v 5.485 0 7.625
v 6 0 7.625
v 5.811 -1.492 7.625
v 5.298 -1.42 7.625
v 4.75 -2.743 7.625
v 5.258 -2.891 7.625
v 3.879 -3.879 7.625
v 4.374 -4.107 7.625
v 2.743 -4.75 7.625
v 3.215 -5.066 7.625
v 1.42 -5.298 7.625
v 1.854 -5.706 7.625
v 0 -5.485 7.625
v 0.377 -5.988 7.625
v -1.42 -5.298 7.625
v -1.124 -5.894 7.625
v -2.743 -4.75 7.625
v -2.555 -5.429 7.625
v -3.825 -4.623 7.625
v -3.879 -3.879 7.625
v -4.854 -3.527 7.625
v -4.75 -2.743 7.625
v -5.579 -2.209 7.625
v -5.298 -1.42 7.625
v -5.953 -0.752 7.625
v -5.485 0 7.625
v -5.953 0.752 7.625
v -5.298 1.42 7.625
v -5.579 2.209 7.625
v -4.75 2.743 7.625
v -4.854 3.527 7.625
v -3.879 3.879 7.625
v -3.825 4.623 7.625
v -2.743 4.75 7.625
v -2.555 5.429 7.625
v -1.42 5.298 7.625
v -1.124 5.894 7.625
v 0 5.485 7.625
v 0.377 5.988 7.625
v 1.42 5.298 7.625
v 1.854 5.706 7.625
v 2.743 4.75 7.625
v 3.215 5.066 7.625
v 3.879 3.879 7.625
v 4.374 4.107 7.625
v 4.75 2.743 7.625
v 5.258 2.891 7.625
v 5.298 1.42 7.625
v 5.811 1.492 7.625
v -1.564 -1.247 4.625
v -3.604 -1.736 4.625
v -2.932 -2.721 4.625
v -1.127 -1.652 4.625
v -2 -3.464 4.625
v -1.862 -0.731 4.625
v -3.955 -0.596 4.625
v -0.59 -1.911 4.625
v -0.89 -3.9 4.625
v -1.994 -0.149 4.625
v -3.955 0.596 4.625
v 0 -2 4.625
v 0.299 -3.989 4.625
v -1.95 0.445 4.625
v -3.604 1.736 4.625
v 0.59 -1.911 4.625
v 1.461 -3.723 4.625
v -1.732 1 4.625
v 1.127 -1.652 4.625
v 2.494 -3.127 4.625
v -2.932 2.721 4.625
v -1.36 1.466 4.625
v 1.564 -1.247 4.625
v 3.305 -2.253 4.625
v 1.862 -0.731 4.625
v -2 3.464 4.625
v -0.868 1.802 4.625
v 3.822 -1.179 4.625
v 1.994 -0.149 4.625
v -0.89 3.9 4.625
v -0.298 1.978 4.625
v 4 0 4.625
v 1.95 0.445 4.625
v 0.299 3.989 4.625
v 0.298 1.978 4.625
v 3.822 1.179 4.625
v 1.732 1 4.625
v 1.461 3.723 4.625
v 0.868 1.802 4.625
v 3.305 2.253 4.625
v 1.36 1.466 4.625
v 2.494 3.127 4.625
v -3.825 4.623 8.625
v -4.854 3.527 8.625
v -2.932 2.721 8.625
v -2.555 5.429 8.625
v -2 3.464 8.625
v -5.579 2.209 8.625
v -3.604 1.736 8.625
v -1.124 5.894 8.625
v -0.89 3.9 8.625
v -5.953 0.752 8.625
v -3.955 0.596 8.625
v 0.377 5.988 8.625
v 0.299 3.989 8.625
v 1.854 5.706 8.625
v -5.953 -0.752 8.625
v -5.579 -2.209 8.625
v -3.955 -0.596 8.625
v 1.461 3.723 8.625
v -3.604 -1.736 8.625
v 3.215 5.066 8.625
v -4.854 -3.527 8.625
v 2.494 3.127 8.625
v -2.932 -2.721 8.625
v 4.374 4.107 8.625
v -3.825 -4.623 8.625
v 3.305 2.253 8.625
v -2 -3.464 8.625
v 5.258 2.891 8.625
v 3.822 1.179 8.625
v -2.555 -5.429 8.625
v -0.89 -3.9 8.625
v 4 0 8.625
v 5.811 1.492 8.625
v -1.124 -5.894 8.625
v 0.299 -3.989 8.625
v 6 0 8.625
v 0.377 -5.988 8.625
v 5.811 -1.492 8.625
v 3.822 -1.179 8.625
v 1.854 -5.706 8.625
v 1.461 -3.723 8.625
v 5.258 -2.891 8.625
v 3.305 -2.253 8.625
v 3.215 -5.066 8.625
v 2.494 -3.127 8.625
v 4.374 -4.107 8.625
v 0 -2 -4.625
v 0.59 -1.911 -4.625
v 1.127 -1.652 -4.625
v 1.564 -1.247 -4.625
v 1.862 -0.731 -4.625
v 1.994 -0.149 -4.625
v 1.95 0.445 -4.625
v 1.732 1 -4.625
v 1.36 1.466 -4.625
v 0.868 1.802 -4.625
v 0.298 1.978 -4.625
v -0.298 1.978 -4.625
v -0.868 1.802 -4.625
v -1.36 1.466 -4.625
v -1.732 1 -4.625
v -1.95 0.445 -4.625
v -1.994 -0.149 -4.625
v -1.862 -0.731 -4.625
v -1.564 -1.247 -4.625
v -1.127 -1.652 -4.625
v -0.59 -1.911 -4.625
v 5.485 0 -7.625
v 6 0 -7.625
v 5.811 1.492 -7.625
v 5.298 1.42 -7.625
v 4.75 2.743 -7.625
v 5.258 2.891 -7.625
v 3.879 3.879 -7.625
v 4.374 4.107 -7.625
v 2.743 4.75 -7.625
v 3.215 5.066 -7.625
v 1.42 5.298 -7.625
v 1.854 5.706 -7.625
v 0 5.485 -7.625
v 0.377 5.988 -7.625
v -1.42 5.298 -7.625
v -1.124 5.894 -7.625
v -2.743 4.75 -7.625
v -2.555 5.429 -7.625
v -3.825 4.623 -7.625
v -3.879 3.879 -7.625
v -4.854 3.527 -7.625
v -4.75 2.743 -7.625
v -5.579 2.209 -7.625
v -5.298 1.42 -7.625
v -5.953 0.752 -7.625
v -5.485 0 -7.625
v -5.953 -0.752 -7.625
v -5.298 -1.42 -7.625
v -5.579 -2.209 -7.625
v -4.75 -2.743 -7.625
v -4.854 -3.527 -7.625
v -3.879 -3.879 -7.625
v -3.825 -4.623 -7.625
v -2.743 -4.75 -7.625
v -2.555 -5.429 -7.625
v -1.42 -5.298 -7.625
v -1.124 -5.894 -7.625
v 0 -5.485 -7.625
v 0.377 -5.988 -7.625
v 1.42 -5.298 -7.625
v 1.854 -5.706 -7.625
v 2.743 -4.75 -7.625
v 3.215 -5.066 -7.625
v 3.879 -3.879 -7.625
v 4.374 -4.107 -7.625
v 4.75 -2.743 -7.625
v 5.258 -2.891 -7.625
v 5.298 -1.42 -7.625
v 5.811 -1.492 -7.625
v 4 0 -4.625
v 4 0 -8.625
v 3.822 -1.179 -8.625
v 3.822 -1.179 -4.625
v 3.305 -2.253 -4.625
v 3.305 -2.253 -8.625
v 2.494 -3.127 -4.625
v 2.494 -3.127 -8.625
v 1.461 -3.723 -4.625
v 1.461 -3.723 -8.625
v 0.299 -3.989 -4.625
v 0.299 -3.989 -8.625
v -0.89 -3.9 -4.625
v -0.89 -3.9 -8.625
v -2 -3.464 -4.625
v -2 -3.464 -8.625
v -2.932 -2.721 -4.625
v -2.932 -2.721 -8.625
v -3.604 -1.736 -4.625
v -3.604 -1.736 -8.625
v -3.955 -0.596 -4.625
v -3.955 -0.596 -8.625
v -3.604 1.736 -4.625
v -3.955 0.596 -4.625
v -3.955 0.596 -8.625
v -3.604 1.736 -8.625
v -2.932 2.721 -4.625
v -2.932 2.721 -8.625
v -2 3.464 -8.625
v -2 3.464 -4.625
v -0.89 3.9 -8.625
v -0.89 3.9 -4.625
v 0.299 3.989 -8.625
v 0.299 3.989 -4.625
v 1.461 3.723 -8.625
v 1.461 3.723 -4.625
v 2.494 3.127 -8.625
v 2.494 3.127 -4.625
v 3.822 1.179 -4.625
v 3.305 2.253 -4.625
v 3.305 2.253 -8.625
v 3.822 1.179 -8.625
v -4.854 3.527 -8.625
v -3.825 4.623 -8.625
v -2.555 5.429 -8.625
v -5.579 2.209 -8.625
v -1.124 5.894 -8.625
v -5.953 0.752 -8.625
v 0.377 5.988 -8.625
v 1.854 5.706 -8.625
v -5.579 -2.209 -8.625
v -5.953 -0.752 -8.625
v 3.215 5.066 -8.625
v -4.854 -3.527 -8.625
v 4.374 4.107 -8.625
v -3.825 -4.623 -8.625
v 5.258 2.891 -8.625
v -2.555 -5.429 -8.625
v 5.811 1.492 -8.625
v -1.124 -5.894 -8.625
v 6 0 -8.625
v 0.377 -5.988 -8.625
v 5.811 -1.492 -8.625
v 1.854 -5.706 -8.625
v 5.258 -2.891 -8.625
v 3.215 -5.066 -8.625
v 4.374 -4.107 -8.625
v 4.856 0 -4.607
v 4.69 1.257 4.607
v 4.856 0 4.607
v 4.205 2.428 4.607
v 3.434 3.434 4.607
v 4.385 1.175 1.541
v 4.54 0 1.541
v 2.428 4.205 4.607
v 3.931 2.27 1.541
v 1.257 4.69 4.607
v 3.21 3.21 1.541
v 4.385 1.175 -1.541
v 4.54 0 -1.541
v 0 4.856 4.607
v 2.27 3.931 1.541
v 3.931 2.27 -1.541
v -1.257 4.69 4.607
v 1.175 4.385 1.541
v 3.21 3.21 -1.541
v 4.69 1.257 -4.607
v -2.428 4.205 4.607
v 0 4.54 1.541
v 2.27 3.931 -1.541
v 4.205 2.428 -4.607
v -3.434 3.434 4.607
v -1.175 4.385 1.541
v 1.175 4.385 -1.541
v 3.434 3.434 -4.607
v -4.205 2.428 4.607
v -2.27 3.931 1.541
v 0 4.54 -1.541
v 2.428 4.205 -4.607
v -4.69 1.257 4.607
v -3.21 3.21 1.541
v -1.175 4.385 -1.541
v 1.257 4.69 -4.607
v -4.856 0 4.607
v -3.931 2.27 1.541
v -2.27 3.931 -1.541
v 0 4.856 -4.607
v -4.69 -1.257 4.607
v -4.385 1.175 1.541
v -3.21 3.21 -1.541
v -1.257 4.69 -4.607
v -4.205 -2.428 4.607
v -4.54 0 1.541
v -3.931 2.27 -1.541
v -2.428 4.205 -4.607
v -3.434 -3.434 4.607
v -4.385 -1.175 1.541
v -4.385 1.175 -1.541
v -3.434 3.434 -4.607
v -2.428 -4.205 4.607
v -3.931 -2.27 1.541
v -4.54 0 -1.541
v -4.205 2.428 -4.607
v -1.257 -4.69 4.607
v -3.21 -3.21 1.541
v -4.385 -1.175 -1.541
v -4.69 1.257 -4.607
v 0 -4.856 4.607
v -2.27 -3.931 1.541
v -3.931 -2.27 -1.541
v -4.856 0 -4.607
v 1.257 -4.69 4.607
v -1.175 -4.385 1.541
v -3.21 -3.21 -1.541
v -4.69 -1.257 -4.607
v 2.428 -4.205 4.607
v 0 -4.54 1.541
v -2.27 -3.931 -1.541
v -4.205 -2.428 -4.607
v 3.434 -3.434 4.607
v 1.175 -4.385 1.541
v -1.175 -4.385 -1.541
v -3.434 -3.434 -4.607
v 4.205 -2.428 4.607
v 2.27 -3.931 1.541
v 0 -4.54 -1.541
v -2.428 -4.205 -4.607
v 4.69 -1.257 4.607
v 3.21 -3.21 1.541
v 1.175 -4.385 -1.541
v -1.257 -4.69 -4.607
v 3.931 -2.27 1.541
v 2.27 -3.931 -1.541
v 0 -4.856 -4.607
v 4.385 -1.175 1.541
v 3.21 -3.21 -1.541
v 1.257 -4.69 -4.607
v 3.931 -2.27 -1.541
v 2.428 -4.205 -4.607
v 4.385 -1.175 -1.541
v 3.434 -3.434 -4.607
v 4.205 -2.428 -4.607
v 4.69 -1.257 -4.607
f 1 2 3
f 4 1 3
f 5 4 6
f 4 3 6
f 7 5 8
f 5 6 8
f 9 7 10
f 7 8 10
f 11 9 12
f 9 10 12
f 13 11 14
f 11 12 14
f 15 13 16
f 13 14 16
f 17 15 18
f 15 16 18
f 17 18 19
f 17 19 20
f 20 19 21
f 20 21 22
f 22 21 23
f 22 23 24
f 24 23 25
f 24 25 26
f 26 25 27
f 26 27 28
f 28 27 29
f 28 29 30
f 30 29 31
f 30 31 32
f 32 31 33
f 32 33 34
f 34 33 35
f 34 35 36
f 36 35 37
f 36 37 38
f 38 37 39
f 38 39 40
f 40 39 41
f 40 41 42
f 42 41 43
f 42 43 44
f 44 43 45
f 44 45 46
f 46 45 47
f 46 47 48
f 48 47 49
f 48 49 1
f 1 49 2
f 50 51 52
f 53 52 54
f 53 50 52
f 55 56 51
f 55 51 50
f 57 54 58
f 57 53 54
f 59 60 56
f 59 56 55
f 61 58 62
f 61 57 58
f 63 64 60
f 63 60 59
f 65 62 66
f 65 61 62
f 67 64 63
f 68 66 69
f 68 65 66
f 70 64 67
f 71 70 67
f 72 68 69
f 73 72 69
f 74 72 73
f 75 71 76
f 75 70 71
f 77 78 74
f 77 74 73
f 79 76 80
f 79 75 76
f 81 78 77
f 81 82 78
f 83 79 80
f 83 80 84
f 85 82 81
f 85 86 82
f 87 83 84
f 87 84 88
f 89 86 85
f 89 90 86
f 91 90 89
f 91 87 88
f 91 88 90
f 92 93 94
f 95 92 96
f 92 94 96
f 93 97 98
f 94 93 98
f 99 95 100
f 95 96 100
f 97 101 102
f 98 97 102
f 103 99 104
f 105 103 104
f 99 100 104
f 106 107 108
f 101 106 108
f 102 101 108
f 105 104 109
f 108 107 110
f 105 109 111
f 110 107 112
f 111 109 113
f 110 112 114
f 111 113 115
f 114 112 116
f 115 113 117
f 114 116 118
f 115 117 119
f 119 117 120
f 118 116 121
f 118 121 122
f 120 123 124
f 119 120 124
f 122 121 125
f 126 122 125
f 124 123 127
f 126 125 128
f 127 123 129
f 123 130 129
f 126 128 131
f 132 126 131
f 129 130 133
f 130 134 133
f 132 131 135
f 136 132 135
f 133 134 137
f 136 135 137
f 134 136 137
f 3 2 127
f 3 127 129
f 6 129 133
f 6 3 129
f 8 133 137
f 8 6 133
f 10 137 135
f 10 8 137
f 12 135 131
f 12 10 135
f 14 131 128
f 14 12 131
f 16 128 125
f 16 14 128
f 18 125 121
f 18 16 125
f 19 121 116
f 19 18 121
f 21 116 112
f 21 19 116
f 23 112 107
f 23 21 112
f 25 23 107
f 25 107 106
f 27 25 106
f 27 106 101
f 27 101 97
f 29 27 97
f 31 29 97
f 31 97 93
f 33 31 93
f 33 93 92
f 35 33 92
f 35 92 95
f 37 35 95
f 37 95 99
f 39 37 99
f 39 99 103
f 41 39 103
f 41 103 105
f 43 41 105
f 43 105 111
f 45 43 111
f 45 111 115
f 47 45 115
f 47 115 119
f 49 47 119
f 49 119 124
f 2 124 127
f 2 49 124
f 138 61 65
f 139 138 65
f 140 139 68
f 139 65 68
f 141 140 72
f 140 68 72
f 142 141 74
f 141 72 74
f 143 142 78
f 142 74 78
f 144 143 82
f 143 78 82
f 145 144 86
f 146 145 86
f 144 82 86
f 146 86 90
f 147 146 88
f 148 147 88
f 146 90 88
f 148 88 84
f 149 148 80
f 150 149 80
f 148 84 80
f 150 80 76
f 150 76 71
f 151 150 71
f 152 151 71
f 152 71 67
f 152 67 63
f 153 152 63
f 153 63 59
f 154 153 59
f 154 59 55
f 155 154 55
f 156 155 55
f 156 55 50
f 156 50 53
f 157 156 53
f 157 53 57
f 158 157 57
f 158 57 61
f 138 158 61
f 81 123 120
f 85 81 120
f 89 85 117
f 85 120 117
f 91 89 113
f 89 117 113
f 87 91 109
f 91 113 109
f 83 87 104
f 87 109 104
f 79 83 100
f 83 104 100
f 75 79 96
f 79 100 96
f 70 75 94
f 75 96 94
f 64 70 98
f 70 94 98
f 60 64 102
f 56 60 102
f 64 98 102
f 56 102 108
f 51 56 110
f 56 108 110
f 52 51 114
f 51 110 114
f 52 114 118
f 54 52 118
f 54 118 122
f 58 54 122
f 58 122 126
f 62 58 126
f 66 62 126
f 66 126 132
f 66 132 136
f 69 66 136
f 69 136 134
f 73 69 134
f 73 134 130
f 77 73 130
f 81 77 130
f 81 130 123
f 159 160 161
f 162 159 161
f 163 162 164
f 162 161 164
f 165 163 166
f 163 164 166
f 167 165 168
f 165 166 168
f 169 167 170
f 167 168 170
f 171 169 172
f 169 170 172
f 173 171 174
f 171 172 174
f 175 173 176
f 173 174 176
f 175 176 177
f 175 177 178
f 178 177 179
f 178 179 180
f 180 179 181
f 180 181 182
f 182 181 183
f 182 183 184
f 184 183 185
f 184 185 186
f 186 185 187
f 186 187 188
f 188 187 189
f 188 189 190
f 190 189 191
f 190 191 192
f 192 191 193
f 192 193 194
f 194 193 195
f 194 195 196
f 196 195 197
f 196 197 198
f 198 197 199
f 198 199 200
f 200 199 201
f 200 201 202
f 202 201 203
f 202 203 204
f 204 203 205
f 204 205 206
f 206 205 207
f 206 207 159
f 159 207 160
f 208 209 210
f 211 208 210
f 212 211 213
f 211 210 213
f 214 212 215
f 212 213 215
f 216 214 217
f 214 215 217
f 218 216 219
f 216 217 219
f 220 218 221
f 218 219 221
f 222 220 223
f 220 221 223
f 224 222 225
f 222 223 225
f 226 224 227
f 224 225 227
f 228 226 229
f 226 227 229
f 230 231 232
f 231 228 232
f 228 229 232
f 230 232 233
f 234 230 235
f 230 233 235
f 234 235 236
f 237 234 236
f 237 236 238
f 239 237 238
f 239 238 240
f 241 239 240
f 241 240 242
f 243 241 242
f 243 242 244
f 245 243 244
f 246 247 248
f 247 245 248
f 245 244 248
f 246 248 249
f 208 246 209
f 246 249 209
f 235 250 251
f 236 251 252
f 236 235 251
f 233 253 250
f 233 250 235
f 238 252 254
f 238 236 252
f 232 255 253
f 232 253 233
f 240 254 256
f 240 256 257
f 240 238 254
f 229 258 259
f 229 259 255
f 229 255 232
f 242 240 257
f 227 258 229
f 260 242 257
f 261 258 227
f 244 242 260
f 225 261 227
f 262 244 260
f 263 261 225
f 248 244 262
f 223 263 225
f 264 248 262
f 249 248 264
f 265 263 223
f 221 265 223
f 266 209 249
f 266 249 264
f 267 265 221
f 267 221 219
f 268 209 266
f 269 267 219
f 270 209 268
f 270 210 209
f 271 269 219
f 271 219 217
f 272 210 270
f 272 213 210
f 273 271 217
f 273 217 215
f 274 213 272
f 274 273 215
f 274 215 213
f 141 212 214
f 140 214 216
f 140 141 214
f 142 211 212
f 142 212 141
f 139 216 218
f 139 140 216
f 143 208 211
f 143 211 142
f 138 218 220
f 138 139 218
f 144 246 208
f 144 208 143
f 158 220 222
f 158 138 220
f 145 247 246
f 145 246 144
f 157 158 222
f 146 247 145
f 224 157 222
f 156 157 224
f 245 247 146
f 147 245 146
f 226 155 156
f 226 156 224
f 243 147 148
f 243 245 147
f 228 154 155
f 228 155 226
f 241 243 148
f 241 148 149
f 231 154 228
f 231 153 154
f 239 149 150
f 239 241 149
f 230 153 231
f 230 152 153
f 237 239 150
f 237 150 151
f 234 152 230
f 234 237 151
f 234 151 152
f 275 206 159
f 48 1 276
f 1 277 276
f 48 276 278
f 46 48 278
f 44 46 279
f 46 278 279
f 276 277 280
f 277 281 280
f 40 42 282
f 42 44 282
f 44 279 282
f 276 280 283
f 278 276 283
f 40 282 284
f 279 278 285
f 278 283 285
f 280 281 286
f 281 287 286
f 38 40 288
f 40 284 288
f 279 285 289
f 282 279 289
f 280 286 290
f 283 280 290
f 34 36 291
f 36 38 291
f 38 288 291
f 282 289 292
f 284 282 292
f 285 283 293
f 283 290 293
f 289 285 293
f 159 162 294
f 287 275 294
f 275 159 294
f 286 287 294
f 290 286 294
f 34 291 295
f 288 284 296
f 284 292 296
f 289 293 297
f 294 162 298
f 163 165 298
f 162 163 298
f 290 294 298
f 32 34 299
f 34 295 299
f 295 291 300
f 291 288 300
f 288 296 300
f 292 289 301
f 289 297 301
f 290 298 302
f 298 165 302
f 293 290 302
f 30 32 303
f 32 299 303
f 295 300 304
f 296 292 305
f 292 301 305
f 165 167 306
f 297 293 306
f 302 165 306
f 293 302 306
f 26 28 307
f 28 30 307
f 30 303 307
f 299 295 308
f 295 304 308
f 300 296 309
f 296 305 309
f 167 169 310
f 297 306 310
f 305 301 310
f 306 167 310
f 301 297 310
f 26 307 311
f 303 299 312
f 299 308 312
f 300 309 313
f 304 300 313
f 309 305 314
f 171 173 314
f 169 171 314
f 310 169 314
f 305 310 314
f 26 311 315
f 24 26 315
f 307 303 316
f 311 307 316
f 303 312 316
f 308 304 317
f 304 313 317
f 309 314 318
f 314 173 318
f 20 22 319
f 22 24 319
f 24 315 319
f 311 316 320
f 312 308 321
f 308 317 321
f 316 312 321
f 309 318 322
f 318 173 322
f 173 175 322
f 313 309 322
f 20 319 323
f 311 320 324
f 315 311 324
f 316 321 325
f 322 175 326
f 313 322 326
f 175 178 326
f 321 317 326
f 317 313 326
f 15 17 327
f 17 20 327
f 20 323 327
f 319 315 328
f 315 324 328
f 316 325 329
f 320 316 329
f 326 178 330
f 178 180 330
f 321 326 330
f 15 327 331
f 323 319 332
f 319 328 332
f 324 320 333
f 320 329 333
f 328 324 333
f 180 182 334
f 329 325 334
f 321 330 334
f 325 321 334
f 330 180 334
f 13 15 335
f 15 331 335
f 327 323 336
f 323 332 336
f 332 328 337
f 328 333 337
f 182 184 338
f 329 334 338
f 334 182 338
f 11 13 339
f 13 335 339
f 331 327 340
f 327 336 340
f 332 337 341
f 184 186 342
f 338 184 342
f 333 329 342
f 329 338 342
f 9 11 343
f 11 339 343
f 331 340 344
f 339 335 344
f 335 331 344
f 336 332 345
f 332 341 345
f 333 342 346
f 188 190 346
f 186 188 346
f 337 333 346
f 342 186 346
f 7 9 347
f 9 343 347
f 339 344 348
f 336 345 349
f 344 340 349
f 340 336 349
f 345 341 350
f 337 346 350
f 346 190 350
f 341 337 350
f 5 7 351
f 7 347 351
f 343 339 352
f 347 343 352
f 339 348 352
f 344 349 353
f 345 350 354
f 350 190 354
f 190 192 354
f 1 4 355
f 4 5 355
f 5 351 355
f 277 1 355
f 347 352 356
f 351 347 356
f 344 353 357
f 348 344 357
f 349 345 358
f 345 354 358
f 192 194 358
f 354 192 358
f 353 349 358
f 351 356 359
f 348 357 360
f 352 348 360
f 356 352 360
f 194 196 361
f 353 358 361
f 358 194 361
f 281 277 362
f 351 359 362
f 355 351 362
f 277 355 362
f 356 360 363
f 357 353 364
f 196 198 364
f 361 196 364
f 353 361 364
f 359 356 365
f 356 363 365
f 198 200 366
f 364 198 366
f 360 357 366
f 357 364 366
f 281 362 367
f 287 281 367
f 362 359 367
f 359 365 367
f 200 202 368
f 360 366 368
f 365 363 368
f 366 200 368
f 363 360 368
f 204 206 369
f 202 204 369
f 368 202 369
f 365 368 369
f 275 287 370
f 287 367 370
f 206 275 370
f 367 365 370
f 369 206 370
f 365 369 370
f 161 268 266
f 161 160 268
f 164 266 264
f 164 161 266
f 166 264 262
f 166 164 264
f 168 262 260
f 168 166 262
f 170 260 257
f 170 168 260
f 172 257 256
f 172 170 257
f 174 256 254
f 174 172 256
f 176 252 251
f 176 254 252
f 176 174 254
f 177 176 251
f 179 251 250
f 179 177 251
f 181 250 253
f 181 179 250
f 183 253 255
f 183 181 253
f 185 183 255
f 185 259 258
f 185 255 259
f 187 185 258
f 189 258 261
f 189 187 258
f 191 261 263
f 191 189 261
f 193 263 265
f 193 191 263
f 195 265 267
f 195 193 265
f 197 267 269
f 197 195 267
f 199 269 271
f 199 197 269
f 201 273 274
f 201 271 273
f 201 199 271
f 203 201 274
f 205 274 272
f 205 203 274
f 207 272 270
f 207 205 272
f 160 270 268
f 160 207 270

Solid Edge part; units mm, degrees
sketch "Sketch1" plane through (0, 0, 0) normal (0, -1, 0) x (1, 0, 0)
  arc A0 (5.4852, 7.625) -> (5.4852, -7.625) centre (34.5, 0) ccw
  line L0 (6, -7.625) -> (5.4852, -7.625)
  line L1 (6, -8.625) -> (6, -7.625)
  line L2 (0, -8.625) -> (6, -8.625)
  line L3 (0, 8.625) -> (0, -8.625)
  line L4 (0, 8.625) -> (6, 8.625)
  line L5 (6, 8.625) -> (6, 7.625)
  line L6 (6, 7.625) -> (5.4852, 7.625)
revolve "RevolvedProtrusion1" add sketch "Sketch1" angle 360 about axis through (0, 0, 8.625) along (0, 0, -1)
hole "Hole1" at (0, 0, 8.625) direction (0, 0, -1) diameter 4 end up to next
sketch "Sketch2" plane through (0, 0, 8.625) normal (0, 0, 1) x (1, 0, 0)
  circle A0 centre (0, 0) radius 4
extrude "VaciadoExtruido_1" cut sketch "Sketch2" against normal blind 4
mirror "Mirror1" about plane through (0, 0, 0) normal (0, 0, 1) of "VaciadoExtruido_1"
